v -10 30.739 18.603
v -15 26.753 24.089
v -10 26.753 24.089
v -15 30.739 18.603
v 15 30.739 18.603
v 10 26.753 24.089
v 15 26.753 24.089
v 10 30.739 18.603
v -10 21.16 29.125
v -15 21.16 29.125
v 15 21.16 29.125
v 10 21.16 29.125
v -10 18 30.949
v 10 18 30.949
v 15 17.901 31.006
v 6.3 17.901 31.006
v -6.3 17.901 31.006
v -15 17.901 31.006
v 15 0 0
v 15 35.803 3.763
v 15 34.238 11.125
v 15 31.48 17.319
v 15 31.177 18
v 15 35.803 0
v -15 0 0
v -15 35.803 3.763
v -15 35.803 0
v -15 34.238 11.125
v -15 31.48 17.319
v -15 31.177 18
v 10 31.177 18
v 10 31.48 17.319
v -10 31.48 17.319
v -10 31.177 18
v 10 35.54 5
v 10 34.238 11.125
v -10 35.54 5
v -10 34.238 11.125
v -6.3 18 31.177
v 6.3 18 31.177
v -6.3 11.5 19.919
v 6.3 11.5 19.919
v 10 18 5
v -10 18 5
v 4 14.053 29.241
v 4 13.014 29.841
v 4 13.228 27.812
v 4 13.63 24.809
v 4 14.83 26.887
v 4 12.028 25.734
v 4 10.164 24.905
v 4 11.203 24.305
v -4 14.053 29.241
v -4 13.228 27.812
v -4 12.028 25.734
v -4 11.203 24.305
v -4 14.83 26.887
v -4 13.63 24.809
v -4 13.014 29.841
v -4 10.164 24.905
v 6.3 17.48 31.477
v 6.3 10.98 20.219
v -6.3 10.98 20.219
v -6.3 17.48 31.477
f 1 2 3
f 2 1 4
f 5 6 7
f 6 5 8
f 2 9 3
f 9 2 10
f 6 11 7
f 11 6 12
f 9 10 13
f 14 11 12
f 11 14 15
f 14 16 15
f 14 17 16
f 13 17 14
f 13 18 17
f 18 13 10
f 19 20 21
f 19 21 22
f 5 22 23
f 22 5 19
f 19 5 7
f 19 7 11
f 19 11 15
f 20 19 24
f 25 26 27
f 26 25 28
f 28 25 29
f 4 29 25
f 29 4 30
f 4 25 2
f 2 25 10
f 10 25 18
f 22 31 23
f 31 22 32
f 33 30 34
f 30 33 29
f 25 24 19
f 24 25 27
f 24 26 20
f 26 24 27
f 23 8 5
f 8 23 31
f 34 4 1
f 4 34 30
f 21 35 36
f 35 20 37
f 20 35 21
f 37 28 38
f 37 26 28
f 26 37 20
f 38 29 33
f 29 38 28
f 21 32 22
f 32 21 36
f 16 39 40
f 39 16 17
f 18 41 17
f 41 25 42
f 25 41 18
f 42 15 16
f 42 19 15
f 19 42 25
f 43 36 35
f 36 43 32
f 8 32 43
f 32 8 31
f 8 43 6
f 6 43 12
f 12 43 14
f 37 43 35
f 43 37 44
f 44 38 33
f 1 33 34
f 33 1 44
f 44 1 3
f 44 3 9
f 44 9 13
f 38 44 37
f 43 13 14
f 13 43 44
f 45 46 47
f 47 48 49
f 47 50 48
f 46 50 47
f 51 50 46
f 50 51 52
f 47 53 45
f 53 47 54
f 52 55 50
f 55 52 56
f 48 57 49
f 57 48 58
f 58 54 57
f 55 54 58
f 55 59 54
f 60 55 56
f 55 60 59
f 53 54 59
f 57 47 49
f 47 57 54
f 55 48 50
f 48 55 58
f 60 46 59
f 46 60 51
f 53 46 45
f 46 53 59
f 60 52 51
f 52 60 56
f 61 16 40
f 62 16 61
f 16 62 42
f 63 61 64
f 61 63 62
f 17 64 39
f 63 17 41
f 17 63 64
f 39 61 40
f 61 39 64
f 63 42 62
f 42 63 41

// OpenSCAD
innerMountCube=[8,5.7,1.2];
//innerMountCube=[8,5.7,1.4];
lowerMountPlate=[12.6,13,0.6];
//lowerMountPlate=[12.6,13,2.3];
basePlateSize=[30,36,0];
mountHeightHolder=[8,2.4,1.85];
//mountHeightHolder=[8,2.4,1.6];

DashCamMount();




module DashCamMount(){
    translate([-basePlateSize[0]/2,0,0])
        difference(){
            rotate([0,270,180])
                arcCylinder(basePlateSize[0],basePlateSize[1],60);

            // Cutout at Back
            translate([5,basePlateSize[1]/2,5])
                cube([basePlateSize[0]-10,basePlateSize[1],30]);
        }

    // mounting Plate
    rotate([60,0,0])
        translate([0,basePlateSize[1]-lowerMountPlate[1]/2,0]){
        cubeCenterXY(lowerMountPlate);
        translate([0,0,lowerMountPlate[2]]){
            
            cubeCenterXY(mountHeightHolder);
            translate([0,0,mountHeightHolder[2]*1]){

                // Inner mount Cube
                cubeCenterXY(innerMountCube);
            }
            
        }
    }
}


module cubeCenterXY(dimensions){
    translate([-dimensions[0]*.5,-dimensions[1]*.5,0])
    cube(dimensions);
}


module halfCylinder(h,r) {
  intersection() {
    cylinder(h=h,r=r);
    translate([0,-r,0]) cube([r,2*r,h]);
  }
}

module arcCylinder(h,r,angle) {
  if (angle > 180) {
    union() {
      halfCylinder(h,r);
      rotate([0,0,angle-180]) halfCylinder(h,r);
    }
  } else {
    intersection() {
      halfCylinder(h,r);
      rotate([0,0,angle-180]) halfCylinder(h,r);
    }
  }
}
